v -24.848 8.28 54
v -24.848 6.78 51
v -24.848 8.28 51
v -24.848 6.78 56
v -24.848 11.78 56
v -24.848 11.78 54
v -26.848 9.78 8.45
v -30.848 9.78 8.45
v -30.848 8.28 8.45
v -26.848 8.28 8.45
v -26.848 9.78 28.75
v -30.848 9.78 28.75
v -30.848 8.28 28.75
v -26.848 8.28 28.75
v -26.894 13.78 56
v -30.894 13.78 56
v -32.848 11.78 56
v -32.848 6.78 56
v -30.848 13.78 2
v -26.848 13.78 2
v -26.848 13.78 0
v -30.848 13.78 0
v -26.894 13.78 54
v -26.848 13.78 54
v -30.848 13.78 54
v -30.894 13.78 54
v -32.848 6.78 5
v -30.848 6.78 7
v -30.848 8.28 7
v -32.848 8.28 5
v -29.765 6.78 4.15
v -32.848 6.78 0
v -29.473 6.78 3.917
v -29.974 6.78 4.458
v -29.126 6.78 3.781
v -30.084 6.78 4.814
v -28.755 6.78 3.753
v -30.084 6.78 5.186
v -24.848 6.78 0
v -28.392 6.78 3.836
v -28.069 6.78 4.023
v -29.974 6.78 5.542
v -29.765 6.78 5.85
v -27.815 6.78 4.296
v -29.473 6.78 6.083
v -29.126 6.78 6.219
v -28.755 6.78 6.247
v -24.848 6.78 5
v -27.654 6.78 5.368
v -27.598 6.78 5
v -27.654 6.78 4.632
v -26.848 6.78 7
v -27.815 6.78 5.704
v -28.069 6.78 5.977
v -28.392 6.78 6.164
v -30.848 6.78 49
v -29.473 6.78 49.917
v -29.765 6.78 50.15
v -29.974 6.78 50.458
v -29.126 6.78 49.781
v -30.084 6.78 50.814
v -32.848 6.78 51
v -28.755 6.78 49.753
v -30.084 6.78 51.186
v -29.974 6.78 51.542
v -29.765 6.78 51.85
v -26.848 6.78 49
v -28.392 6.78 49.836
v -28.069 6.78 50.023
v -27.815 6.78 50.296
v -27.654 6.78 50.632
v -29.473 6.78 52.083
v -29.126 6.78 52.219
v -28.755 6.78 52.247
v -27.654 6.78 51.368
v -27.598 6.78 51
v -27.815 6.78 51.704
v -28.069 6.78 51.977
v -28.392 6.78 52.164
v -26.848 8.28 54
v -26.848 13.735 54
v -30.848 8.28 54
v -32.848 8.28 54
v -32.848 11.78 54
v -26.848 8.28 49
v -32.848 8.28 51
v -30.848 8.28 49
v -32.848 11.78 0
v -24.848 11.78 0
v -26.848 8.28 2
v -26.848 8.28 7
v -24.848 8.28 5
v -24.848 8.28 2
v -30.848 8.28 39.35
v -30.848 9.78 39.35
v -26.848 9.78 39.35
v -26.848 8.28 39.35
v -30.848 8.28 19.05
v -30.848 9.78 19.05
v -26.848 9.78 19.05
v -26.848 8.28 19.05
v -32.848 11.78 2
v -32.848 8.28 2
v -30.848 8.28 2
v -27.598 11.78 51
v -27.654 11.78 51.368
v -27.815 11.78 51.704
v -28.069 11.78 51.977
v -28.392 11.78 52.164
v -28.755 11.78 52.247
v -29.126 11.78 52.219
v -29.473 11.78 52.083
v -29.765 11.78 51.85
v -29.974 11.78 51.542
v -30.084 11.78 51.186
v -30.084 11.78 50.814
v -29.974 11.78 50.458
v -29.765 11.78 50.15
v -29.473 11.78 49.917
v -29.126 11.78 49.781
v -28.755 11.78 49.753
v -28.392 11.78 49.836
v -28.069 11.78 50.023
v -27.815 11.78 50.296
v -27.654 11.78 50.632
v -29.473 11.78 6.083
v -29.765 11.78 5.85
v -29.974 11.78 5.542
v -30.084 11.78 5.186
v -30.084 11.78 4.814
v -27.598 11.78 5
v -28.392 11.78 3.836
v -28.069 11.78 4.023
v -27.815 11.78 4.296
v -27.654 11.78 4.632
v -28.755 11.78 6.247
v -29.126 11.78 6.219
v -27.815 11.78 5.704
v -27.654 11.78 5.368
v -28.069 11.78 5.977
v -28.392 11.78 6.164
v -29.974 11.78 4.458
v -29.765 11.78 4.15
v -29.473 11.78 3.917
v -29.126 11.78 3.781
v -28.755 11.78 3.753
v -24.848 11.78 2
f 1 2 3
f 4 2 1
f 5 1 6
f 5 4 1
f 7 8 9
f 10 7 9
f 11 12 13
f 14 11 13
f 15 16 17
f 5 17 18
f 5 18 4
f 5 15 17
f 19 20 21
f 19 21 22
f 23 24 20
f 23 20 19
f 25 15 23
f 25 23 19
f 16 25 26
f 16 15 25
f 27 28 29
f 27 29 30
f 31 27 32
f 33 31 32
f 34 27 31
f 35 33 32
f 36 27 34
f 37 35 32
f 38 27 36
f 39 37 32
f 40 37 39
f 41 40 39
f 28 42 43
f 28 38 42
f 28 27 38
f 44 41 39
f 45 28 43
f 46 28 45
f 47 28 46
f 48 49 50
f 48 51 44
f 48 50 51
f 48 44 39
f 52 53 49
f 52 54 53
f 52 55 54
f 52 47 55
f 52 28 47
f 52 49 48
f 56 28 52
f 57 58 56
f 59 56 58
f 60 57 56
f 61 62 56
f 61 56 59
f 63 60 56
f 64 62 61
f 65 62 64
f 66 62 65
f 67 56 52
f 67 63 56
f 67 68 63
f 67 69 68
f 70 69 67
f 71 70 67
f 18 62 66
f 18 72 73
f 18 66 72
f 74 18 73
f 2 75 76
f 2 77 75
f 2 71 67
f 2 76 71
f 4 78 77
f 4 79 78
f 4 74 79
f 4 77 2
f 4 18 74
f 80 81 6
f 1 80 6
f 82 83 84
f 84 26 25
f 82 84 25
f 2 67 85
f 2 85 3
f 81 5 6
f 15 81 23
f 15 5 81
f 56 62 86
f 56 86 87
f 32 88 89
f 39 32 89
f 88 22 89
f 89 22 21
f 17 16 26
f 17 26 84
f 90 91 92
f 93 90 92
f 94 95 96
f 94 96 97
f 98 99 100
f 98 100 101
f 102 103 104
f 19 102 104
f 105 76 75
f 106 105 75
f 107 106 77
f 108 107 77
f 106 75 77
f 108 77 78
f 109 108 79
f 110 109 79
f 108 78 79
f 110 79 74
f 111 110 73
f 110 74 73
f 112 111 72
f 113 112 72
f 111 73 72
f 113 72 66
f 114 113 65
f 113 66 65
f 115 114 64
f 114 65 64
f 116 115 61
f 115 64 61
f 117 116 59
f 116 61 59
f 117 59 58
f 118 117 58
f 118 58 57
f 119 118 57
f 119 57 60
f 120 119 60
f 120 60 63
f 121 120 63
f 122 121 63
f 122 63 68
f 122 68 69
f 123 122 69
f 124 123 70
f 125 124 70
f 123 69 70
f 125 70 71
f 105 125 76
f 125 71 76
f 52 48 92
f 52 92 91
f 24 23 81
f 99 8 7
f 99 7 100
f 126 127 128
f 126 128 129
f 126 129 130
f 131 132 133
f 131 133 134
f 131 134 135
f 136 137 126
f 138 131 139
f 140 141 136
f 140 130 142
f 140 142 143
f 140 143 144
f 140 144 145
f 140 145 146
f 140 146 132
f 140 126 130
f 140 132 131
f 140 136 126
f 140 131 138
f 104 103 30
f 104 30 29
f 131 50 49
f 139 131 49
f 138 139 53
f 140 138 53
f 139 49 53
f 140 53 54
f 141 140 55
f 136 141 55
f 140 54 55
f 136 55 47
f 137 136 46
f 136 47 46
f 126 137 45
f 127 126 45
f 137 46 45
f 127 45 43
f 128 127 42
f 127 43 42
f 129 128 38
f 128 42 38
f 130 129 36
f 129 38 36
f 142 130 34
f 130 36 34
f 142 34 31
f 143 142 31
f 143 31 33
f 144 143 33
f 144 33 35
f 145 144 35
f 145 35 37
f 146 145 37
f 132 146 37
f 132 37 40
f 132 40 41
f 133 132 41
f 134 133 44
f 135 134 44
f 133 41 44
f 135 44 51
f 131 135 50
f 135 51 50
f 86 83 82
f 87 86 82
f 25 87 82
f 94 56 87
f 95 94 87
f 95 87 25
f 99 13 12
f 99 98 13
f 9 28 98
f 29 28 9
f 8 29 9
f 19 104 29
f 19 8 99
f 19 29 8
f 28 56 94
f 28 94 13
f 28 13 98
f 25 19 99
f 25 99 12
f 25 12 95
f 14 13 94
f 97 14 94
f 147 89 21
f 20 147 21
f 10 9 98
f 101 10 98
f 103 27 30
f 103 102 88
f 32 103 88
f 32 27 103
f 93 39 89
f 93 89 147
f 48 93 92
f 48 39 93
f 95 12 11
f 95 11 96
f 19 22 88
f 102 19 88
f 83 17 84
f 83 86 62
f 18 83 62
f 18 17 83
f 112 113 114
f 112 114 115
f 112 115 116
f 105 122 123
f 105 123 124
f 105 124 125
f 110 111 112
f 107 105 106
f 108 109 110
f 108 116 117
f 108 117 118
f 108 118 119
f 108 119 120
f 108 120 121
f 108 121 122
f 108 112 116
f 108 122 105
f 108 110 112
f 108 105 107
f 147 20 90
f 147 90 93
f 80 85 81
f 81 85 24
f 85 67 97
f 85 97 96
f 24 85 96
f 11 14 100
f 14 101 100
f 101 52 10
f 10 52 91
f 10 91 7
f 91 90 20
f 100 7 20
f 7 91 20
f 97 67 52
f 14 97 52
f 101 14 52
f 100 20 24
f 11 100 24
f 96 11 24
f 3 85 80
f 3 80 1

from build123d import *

# Parameters (mm, degrees)
F1_DEPTH  = 2
F3_DEPTH  = 1.5
F5_W      = 4
F5_H      = 5.5
F6_DEPTH  = 52
F4_R      = 1.25
F7_DEPTH  = 5
F8_W      = 1.5
F8_H      = 10.6
F9_DEPTH  = 25
F11_DEPTH = 2


with BuildPart() as f1:
    # F0 (on Top) → F1 (new body)
    with BuildSketch(Plane.XY):
        Polygon((-32.848224, 11.779634), (-32.848224, 6.779634), (-24.848224, 6.779634), (-24.848224, 11.779634), (-26.848224, 13.779634), (-30.848224, 13.779634), align=None)
    extrude(amount=F1_DEPTH)

    # F2 (on face) → F3 (join)
    with BuildSketch(Plane.XZ.offset(-6.779634)):
        Polygon((-32.848224, 5), (-32.848224, 2), (-24.848224, 2), (-24.848224, 5), (-26.848224, 7), (-26.848224, 49), (-24.848224, 51), (-24.848224, 56), (-32.848224, 56), (-32.848224, 51), (-30.848224, 49), (-30.848224, 7), align=None)
    extrude(amount=-F3_DEPTH)

    # F5 (on face) → F6 (join)
    with BuildSketch(Plane.XY.offset(2)):
        with Locations((-28.848224, 11.029634)):
            Rectangle(F5_W, F5_H)
    extrude(amount=F6_DEPTH)

    # F4 (on face) → F7 (cut)
    with BuildSketch(Plane.XZ.offset(-6.779634)):
        with Locations((-28.848224, 5)):
            Circle(F4_R)
        with Locations((-28.848224, 51)):
            Circle(F4_R)
    extrude(amount=-F7_DEPTH, mode=Mode.SUBTRACT)

    # F8 (on face) → F9 (cut)
    with BuildSketch(Plane(origin=(-30.848224, 0, 0), x_dir=(0, -1, 0), z_dir=(-1, 0, 0))):
        with Locations((-9.029634, 13.75)):
            Rectangle(F8_W, F8_H)
        with Locations((-9.029634, 34.05)):
            Rectangle(F8_W, F8_H)
    extrude(amount=-F9_DEPTH, mode=Mode.SUBTRACT)

    # F10 (on face) → F11 (join)
    with BuildSketch(Plane.XY.offset(56)):
        Polygon((-32.848224, 8.279634), (-24.848224, 8.279634), (-24.848224, 11.779634), (-26.893736, 13.779634), (-30.893736, 13.779634), (-32.848224, 11.779634), align=None)
    extrude(amount=-F11_DEPTH)


solid = f1.part
